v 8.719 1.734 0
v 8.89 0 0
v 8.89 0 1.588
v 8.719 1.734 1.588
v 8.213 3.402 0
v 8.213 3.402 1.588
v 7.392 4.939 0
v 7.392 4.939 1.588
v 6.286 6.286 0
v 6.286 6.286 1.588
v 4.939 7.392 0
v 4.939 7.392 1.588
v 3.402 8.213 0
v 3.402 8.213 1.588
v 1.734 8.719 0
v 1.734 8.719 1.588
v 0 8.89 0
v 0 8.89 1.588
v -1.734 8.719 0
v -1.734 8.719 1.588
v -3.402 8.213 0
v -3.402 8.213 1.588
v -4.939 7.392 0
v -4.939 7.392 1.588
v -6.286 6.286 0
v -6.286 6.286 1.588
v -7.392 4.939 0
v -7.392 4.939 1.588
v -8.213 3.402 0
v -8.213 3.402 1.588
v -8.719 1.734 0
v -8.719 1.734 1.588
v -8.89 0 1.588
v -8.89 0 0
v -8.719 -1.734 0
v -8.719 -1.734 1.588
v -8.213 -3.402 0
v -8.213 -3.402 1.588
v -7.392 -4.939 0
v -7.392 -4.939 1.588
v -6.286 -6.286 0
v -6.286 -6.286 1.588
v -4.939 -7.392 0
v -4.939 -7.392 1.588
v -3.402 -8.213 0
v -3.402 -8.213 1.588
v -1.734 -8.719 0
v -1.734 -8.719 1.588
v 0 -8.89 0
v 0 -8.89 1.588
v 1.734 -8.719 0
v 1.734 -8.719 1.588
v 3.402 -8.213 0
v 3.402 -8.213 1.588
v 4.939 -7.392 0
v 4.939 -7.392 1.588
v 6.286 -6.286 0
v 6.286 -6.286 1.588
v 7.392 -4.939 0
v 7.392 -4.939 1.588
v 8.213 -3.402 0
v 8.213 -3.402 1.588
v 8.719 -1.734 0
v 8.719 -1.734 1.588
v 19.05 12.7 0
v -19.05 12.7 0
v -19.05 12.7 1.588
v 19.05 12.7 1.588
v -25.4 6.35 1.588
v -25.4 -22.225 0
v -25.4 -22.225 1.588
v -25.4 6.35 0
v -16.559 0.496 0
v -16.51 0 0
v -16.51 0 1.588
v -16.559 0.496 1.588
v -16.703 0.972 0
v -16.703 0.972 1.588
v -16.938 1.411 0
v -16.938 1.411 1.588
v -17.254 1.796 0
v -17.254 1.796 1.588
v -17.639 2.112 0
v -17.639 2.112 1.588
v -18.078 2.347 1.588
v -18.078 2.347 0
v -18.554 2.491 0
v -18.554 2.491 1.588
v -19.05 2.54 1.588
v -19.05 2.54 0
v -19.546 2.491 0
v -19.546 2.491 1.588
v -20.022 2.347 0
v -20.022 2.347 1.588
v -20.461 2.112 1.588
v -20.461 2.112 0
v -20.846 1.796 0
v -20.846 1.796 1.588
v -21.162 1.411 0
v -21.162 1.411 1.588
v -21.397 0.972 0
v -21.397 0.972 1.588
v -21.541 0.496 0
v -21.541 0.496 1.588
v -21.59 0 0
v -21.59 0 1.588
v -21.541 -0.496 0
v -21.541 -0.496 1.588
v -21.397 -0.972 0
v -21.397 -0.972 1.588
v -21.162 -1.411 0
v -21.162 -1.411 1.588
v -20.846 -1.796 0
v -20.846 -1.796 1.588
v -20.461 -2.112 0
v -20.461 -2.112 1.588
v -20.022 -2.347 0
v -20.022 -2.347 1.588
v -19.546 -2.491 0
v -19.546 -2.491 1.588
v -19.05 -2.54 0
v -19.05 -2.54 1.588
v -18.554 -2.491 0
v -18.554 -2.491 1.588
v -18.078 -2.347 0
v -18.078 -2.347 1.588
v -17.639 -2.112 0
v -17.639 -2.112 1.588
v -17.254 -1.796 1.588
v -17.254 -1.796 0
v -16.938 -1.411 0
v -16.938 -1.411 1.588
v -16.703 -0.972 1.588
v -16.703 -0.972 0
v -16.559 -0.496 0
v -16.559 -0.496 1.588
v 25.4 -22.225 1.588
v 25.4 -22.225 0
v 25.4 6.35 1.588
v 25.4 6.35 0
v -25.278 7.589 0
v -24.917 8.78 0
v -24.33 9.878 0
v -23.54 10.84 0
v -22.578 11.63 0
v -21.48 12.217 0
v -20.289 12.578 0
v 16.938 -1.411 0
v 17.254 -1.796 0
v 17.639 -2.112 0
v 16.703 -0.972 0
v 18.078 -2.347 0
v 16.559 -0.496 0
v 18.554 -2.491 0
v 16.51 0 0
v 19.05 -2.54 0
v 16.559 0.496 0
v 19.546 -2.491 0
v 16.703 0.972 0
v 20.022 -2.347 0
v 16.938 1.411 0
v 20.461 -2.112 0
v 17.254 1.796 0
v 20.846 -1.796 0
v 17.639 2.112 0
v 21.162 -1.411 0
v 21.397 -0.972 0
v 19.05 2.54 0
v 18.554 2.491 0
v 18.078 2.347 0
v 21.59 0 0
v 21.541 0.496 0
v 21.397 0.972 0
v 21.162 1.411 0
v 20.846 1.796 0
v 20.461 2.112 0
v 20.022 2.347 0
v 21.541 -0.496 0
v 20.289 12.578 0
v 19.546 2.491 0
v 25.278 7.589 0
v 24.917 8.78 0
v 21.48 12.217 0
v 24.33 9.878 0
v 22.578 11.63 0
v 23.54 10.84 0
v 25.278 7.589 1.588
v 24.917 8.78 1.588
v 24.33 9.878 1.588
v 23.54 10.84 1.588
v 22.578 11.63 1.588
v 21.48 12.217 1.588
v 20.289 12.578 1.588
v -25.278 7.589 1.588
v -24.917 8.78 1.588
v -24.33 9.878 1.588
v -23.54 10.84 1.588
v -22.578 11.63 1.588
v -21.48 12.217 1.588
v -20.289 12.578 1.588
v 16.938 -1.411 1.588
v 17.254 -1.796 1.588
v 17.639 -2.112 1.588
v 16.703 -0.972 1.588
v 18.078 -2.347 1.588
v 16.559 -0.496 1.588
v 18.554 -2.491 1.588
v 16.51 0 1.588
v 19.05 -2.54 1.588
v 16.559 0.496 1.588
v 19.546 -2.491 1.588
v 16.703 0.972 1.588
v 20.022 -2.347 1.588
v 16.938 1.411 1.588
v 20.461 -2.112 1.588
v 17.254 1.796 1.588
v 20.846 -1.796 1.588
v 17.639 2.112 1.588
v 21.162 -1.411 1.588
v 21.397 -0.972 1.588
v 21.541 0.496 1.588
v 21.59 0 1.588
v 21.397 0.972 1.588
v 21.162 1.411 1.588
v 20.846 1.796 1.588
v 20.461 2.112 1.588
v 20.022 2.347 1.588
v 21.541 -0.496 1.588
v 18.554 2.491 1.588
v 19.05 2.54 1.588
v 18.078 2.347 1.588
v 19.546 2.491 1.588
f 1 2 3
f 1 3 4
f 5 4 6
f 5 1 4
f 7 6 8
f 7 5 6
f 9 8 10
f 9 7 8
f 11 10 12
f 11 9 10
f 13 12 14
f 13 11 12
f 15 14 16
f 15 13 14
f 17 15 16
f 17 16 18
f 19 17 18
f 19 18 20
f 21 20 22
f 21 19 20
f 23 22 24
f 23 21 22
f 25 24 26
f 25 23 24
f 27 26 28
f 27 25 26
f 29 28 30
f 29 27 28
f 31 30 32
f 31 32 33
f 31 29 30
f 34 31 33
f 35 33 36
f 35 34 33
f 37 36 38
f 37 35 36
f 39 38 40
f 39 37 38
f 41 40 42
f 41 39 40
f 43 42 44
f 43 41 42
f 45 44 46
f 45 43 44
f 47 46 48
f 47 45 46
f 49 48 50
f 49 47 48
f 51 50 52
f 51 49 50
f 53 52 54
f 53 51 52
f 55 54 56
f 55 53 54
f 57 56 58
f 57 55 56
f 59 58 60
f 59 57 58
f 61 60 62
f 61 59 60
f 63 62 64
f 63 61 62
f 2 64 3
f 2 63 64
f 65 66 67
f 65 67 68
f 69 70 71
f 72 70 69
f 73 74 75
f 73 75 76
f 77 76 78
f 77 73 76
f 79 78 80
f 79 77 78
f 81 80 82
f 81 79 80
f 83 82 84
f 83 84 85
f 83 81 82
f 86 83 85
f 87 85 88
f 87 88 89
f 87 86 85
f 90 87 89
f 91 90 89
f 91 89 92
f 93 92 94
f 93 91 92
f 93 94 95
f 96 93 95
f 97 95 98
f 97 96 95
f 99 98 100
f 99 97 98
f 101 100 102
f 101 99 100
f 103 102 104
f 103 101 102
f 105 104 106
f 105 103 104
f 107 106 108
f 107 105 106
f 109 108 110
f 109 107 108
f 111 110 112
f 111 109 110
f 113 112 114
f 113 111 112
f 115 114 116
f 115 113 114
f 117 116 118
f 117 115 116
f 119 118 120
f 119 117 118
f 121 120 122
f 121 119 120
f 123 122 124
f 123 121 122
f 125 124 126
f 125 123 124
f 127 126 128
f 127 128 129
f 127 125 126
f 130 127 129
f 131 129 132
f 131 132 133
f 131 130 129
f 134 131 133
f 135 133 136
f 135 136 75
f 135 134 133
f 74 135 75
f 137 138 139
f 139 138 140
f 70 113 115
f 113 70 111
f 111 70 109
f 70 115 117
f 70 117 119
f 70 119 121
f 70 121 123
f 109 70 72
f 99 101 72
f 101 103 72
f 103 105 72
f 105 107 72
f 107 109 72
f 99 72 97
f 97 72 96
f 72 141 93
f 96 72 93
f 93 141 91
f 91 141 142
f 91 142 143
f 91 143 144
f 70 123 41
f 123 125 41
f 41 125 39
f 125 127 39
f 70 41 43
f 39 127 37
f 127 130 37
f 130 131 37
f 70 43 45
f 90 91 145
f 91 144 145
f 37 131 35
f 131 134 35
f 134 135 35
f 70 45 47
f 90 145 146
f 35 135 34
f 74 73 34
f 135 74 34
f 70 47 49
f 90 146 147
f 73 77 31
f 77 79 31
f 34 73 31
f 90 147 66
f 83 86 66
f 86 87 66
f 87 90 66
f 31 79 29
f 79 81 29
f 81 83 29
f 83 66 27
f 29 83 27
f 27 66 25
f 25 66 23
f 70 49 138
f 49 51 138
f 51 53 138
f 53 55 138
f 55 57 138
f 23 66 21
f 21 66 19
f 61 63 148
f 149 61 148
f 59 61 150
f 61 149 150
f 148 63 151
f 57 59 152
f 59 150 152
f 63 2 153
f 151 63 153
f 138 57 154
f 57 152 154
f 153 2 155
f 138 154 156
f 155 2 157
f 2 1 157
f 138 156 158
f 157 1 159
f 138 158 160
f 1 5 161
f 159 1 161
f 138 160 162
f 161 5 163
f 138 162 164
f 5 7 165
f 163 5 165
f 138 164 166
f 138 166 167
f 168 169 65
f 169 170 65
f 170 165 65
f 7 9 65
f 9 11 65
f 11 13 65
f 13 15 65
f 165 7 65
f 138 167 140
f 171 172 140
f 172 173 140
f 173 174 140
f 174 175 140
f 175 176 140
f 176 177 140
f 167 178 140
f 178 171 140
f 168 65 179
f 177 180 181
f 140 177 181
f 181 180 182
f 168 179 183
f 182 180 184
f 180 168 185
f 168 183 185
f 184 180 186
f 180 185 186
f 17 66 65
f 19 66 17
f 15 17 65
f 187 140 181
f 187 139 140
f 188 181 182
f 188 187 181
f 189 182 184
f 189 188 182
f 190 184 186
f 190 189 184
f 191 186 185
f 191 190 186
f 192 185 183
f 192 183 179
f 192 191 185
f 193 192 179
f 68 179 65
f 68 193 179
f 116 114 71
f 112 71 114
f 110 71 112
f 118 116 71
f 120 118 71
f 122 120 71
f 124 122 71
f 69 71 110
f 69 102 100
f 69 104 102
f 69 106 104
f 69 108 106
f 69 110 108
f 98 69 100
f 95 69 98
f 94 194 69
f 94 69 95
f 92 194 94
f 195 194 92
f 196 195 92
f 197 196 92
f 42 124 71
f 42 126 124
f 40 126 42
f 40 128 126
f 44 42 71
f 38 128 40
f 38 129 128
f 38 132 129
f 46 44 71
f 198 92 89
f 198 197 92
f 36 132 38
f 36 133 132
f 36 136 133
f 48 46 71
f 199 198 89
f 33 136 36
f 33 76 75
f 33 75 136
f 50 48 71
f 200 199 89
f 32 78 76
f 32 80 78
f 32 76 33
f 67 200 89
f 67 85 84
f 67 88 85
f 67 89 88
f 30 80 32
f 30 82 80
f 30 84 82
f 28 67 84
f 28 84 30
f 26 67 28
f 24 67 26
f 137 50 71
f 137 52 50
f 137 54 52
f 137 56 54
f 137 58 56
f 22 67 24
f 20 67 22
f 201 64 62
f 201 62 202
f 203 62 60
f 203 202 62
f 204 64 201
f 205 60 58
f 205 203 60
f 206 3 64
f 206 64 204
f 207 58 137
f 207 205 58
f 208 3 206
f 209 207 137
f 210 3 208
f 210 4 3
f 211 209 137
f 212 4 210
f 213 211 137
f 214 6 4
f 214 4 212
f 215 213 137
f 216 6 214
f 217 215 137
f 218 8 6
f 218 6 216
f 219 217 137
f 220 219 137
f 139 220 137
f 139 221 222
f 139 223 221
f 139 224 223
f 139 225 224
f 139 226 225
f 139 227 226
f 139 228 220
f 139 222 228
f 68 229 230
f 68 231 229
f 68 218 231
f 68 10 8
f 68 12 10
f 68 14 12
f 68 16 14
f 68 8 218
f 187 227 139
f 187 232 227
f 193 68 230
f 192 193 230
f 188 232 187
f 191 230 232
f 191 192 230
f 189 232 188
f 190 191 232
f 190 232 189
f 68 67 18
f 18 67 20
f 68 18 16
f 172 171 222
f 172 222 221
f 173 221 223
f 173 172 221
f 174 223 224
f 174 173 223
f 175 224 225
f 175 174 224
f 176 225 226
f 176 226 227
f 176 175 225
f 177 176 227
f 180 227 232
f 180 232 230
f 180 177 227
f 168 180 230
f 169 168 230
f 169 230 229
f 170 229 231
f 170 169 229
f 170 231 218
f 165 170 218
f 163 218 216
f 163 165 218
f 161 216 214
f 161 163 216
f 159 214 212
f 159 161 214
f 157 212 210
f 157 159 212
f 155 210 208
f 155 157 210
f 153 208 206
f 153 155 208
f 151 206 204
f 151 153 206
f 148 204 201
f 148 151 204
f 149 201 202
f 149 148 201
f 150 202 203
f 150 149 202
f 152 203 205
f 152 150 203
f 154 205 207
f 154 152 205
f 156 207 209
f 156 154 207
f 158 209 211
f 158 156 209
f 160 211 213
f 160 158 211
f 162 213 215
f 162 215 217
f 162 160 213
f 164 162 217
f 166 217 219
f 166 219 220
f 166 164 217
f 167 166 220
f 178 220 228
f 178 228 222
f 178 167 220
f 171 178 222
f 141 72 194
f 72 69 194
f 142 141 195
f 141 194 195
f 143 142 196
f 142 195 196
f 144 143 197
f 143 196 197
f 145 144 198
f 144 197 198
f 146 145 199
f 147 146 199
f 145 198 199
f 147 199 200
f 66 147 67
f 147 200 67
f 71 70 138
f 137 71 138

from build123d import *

# Parameters (mm, degrees)
SKETCH1_W           = 50.8
SKETCH1_H           = 25.4
SKETCH1_R           = 8.89
SKETCH1_R_2         = 2.54
BOSS_EXTRUDE1_DEPTH = 1.5875
SKETCH3_W           = 50.8
SKETCH3_H           = 9.525
BOSS_EXTRUDE2_DEPTH = 1.5875
FILLET1_R           = 6.35


with BuildPart() as part:
    # Sketch1 → Boss-Extrude1 (new body)
    with BuildSketch(Plane.XY):
        Rectangle(SKETCH1_W, SKETCH1_H)
        Circle(SKETCH1_R, mode=Mode.SUBTRACT)
        with Locations((19.05, 0)):
            Circle(SKETCH1_R_2, mode=Mode.SUBTRACT)
        with Locations((-19.05, 0)):
            Circle(SKETCH1_R_2, mode=Mode.SUBTRACT)
    extrude(amount=BOSS_EXTRUDE1_DEPTH)

    # Sketch3 → Boss-Extrude2 (add)
    with BuildSketch(Plane.XY):
        with Locations((0, -17.4625)):
            Rectangle(SKETCH3_W, SKETCH3_H)
    extrude(amount=BOSS_EXTRUDE2_DEPTH)

    # Fillet1
    fillet1_edges = [part.edges().sort_by_distance(p)[0] for p in [
        (-25.4, 12.7, 0.79375),
        (25.4, 12.7, 0.79375),
    ]]
    fillet(fillet1_edges, radius=FILLET1_R)


solid = part.part
